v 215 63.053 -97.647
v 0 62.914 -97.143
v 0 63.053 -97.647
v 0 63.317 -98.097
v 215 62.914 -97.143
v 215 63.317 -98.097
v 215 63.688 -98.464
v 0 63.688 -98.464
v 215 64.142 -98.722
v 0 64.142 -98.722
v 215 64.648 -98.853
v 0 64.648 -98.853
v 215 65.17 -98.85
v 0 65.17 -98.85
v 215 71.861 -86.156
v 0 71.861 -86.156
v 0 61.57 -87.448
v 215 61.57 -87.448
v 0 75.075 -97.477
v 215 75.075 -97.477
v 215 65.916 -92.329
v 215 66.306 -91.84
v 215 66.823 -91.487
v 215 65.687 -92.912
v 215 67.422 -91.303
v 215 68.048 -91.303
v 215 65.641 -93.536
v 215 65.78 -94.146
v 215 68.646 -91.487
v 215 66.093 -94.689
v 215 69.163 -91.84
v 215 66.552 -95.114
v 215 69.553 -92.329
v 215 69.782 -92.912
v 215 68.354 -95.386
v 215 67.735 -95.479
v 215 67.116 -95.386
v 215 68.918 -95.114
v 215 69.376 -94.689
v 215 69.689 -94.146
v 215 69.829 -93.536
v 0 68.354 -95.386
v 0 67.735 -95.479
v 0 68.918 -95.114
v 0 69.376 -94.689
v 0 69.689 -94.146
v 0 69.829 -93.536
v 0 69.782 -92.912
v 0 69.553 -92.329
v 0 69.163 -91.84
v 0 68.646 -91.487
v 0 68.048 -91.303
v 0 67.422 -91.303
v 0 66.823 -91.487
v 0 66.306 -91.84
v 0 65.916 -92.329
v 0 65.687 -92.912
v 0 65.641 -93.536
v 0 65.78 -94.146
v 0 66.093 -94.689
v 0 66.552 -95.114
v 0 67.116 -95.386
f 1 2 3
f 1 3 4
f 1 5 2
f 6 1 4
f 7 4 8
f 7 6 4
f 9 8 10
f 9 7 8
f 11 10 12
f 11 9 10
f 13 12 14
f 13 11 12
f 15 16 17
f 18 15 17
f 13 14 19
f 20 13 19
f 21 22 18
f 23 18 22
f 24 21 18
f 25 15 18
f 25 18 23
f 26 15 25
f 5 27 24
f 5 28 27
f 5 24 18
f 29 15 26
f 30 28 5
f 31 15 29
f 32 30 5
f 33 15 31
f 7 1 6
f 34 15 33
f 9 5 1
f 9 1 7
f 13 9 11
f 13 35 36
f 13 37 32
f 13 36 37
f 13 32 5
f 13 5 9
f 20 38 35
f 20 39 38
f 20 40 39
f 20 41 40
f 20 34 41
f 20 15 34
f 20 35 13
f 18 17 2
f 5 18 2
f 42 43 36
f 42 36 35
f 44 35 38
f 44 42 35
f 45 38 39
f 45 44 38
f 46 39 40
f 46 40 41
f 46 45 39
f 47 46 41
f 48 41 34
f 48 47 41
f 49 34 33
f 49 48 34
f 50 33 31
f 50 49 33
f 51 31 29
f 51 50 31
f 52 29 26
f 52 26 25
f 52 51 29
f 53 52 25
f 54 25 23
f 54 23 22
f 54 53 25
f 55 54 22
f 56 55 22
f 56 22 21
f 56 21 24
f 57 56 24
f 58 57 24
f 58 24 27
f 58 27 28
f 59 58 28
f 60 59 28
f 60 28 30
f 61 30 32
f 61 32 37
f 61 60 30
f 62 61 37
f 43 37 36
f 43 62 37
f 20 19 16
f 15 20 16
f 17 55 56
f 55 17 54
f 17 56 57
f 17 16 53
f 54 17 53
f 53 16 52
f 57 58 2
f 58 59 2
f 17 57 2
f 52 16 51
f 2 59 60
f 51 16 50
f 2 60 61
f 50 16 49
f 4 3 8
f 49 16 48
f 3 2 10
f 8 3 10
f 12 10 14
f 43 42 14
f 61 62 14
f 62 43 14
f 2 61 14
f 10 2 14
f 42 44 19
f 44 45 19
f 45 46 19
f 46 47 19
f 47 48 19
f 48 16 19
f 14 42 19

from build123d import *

# Parameters (mm, degrees)
SKETCH1_R           = 2.1
BOSS_EXTRUDE1_DEPTH = 215
FILLET1_R           = 2


with BuildPart() as part:
    # Sketch1 → Boss-Extrude1 (new body)
    with BuildSketch(Plane(origin=(0, 0, 0), x_dir=(0, 0, -1), z_dir=(1, 0, 0))):
        Polygon((87.447995492, 61.569861664), (99.124438977, 63.188614895), (97.476589763, 75.074934467), (86.155762657, 71.861000707), align=None)
        with Locations((93.379181481, 67.734629599)):
            Circle(SKETCH1_R, mode=Mode.SUBTRACT)
    extrude(amount=BOSS_EXTRUDE1_DEPTH)

    # Fillet1
    fillet1_edges = [part.edges().sort_by_distance(p)[0] for p in [
        (107.5, 63.188614895, -99.124438977),
    ]]
    fillet(fillet1_edges, radius=FILLET1_R)


solid = part.part
